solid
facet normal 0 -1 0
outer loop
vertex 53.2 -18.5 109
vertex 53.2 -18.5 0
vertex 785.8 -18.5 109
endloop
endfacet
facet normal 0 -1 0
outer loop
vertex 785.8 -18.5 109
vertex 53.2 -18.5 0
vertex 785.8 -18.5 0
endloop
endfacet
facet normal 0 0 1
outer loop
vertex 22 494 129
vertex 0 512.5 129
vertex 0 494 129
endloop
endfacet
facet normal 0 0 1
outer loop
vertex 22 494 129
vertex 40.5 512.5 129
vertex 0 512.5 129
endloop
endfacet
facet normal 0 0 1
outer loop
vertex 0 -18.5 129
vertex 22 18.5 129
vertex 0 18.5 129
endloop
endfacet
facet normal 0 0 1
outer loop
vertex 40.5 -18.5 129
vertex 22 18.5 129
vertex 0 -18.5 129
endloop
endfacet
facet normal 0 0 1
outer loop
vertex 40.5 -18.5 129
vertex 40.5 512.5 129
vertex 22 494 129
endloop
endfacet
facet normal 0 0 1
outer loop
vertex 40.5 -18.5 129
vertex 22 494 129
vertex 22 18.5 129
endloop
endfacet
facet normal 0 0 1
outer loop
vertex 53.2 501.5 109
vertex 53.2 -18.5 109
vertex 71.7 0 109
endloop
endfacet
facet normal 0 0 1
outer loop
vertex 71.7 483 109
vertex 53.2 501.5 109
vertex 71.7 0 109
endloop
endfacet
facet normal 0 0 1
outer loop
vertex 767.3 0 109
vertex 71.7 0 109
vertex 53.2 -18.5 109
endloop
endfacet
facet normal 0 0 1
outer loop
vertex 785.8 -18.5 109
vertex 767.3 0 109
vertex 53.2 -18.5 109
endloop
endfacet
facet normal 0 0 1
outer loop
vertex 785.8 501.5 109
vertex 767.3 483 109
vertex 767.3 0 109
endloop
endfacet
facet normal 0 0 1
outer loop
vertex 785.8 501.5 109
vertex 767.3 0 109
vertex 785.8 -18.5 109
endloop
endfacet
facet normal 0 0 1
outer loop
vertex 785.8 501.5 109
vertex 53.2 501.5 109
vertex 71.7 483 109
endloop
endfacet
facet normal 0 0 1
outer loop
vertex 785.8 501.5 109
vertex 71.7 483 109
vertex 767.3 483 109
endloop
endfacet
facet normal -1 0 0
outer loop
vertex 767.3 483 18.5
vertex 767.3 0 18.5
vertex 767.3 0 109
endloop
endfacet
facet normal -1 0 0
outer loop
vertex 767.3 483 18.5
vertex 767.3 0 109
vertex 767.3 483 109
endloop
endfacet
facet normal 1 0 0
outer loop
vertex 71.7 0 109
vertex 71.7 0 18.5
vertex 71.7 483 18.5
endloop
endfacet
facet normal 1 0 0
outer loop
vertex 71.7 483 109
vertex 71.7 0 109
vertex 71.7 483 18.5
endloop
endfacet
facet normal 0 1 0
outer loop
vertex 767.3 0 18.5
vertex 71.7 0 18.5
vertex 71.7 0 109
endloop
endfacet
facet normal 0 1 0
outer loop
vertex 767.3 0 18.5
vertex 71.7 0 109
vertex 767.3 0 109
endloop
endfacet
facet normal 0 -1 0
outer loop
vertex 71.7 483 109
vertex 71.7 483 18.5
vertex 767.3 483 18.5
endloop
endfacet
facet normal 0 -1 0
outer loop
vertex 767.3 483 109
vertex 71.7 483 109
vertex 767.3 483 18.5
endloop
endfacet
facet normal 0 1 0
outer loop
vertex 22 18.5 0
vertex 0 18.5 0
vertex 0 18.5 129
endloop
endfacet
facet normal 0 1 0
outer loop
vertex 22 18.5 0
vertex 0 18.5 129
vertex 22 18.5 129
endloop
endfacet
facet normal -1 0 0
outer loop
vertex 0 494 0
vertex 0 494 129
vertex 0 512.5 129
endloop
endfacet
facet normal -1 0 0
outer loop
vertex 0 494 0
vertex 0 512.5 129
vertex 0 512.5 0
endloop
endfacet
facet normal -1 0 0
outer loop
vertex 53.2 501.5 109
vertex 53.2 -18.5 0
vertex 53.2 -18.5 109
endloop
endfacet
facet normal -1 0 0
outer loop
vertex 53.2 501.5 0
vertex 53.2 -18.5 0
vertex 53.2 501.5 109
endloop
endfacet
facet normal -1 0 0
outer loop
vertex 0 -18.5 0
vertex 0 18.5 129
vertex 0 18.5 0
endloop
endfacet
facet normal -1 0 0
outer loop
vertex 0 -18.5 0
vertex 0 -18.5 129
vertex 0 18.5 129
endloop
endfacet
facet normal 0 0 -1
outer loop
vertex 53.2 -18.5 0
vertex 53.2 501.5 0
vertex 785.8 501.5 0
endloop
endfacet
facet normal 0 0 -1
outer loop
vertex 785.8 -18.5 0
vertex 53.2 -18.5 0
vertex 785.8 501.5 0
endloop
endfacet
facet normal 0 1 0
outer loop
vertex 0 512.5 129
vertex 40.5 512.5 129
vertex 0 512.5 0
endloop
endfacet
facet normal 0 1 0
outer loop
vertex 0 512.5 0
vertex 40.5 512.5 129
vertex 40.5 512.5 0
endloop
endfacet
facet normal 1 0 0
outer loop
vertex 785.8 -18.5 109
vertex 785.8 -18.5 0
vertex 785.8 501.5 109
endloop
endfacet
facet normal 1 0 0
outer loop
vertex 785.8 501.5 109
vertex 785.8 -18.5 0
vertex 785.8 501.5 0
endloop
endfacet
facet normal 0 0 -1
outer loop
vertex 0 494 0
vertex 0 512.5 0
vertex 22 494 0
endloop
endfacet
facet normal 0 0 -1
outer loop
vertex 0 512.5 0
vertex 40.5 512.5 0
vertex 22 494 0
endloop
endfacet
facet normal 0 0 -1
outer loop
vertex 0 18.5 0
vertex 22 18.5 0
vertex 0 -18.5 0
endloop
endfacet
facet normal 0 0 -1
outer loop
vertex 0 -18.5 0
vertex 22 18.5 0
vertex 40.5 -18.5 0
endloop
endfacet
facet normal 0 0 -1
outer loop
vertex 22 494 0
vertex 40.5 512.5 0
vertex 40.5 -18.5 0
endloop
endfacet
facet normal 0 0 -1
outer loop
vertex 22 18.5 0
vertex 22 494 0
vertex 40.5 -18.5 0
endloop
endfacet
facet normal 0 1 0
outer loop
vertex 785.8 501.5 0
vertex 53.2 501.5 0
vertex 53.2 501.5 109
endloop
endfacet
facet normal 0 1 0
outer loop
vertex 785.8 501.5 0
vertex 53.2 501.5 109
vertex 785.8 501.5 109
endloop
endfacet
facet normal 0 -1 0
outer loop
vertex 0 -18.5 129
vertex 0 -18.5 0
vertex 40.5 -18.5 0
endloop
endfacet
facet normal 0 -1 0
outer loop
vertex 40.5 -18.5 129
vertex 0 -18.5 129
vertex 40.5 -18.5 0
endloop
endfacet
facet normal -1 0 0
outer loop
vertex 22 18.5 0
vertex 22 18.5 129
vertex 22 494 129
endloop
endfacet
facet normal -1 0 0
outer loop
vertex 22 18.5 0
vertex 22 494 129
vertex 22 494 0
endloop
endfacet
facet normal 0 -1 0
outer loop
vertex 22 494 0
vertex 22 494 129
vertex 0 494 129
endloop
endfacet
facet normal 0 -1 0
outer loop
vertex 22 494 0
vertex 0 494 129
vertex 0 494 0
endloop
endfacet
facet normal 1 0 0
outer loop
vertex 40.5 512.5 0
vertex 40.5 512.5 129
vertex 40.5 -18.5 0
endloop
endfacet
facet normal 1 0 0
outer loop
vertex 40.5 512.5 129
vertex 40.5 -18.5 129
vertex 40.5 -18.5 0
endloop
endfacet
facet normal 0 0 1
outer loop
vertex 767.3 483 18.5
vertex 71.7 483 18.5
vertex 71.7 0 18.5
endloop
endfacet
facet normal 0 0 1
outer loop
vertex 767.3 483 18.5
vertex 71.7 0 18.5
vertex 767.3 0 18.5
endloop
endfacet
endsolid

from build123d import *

# Parameters (mm, degrees)
SKETCH_W     = 40.5
SKETCH_H     = 129
PAD_DEPTH    = 18.5
SKETCH001_W  = 22
SKETCH001_H  = 129
PAD001_DEPTH = 18.5
SKETCH002_W  = 18.5
SKETCH002_H  = 129
PAD002_DEPTH = 512.5
SKETCH003_W  = 129
SKETCH003_H  = 18.5
PAD003_DEPTH = 22
SKETCH004_W  = 732.6
SKETCH004_H  = 520
PAD004_DEPTH = 18.5
SKETCH005_W  = 732.6
SKETCH005_H  = 18.5
PAD005_DEPTH = 90.5
SKETCH006_W  = 18.5
SKETCH006_H  = 483
PAD006_DEPTH = 90.5


with BuildPart() as borda:
    # Sketch → Pad (new body)
    with BuildSketch(Plane.XZ):
        with Locations((20.25, 64.5)):
            Rectangle(SKETCH_W, SKETCH_H)
    extrude(amount=PAD_DEPTH)

    # Sketch001 (on Face5 of Pad) → Pad001 (join)
    with BuildSketch(Plane(origin=(0, 0, 0), x_dir=(1, 0, 0), z_dir=(0, 1, 0))):
        with Locations((11, -64.5)):
            Rectangle(SKETCH001_W, SKETCH001_H)
    extrude(amount=PAD001_DEPTH)

    # Sketch002 (on Face5 of Pad001) → Pad002 (join)
    with BuildSketch(Plane(origin=(0, 0, 0), x_dir=(1, 0, 0), z_dir=(0, 1, 0))):
        with Locations((31.25, -64.5)):
            Rectangle(SKETCH002_W, SKETCH002_H)
    extrude(amount=PAD002_DEPTH)

    # Sketch003 (on Face11 of Pad002) → Pad003 (join)
    with BuildSketch(Plane(origin=(22, 0, 0), x_dir=(0, 0, -1), z_dir=(-1, 0, 0))):
        with Locations((-64.5, -503.25)):
            Rectangle(SKETCH003_W, SKETCH003_H)
    extrude(amount=PAD003_DEPTH)


with BuildPart() as gaveta:
    # Sketch004 → Pad004 (new body)
    with BuildSketch(Plane.XY):
        with Locations((419.5, 241.5)):
            Rectangle(SKETCH004_W, SKETCH004_H)
    extrude(amount=PAD004_DEPTH)

    # Sketch005 (on Face6 of Pad004) → Pad005 (join)
    with BuildSketch(Plane.XY.offset(18.5)):
        with Locations((419.5, 492.25)):
            Rectangle(SKETCH005_W, SKETCH005_H)
        with Locations((419.5, -9.25)):
            Rectangle(SKETCH005_W, SKETCH005_H)
    extrude(amount=PAD005_DEPTH)

    # Sketch006 (on Face8 of Pad005) → Pad006 (join)
    with BuildSketch(Plane.XY.offset(18.5)):
        with Locations((62.45, 241.5)):
            Rectangle(SKETCH006_W, SKETCH006_H)
        with Locations((776.55, 241.5)):
            Rectangle(SKETCH006_W, SKETCH006_H)
    extrude(amount=PAD006_DEPTH)


solid = Compound([borda.part, gaveta.part])
